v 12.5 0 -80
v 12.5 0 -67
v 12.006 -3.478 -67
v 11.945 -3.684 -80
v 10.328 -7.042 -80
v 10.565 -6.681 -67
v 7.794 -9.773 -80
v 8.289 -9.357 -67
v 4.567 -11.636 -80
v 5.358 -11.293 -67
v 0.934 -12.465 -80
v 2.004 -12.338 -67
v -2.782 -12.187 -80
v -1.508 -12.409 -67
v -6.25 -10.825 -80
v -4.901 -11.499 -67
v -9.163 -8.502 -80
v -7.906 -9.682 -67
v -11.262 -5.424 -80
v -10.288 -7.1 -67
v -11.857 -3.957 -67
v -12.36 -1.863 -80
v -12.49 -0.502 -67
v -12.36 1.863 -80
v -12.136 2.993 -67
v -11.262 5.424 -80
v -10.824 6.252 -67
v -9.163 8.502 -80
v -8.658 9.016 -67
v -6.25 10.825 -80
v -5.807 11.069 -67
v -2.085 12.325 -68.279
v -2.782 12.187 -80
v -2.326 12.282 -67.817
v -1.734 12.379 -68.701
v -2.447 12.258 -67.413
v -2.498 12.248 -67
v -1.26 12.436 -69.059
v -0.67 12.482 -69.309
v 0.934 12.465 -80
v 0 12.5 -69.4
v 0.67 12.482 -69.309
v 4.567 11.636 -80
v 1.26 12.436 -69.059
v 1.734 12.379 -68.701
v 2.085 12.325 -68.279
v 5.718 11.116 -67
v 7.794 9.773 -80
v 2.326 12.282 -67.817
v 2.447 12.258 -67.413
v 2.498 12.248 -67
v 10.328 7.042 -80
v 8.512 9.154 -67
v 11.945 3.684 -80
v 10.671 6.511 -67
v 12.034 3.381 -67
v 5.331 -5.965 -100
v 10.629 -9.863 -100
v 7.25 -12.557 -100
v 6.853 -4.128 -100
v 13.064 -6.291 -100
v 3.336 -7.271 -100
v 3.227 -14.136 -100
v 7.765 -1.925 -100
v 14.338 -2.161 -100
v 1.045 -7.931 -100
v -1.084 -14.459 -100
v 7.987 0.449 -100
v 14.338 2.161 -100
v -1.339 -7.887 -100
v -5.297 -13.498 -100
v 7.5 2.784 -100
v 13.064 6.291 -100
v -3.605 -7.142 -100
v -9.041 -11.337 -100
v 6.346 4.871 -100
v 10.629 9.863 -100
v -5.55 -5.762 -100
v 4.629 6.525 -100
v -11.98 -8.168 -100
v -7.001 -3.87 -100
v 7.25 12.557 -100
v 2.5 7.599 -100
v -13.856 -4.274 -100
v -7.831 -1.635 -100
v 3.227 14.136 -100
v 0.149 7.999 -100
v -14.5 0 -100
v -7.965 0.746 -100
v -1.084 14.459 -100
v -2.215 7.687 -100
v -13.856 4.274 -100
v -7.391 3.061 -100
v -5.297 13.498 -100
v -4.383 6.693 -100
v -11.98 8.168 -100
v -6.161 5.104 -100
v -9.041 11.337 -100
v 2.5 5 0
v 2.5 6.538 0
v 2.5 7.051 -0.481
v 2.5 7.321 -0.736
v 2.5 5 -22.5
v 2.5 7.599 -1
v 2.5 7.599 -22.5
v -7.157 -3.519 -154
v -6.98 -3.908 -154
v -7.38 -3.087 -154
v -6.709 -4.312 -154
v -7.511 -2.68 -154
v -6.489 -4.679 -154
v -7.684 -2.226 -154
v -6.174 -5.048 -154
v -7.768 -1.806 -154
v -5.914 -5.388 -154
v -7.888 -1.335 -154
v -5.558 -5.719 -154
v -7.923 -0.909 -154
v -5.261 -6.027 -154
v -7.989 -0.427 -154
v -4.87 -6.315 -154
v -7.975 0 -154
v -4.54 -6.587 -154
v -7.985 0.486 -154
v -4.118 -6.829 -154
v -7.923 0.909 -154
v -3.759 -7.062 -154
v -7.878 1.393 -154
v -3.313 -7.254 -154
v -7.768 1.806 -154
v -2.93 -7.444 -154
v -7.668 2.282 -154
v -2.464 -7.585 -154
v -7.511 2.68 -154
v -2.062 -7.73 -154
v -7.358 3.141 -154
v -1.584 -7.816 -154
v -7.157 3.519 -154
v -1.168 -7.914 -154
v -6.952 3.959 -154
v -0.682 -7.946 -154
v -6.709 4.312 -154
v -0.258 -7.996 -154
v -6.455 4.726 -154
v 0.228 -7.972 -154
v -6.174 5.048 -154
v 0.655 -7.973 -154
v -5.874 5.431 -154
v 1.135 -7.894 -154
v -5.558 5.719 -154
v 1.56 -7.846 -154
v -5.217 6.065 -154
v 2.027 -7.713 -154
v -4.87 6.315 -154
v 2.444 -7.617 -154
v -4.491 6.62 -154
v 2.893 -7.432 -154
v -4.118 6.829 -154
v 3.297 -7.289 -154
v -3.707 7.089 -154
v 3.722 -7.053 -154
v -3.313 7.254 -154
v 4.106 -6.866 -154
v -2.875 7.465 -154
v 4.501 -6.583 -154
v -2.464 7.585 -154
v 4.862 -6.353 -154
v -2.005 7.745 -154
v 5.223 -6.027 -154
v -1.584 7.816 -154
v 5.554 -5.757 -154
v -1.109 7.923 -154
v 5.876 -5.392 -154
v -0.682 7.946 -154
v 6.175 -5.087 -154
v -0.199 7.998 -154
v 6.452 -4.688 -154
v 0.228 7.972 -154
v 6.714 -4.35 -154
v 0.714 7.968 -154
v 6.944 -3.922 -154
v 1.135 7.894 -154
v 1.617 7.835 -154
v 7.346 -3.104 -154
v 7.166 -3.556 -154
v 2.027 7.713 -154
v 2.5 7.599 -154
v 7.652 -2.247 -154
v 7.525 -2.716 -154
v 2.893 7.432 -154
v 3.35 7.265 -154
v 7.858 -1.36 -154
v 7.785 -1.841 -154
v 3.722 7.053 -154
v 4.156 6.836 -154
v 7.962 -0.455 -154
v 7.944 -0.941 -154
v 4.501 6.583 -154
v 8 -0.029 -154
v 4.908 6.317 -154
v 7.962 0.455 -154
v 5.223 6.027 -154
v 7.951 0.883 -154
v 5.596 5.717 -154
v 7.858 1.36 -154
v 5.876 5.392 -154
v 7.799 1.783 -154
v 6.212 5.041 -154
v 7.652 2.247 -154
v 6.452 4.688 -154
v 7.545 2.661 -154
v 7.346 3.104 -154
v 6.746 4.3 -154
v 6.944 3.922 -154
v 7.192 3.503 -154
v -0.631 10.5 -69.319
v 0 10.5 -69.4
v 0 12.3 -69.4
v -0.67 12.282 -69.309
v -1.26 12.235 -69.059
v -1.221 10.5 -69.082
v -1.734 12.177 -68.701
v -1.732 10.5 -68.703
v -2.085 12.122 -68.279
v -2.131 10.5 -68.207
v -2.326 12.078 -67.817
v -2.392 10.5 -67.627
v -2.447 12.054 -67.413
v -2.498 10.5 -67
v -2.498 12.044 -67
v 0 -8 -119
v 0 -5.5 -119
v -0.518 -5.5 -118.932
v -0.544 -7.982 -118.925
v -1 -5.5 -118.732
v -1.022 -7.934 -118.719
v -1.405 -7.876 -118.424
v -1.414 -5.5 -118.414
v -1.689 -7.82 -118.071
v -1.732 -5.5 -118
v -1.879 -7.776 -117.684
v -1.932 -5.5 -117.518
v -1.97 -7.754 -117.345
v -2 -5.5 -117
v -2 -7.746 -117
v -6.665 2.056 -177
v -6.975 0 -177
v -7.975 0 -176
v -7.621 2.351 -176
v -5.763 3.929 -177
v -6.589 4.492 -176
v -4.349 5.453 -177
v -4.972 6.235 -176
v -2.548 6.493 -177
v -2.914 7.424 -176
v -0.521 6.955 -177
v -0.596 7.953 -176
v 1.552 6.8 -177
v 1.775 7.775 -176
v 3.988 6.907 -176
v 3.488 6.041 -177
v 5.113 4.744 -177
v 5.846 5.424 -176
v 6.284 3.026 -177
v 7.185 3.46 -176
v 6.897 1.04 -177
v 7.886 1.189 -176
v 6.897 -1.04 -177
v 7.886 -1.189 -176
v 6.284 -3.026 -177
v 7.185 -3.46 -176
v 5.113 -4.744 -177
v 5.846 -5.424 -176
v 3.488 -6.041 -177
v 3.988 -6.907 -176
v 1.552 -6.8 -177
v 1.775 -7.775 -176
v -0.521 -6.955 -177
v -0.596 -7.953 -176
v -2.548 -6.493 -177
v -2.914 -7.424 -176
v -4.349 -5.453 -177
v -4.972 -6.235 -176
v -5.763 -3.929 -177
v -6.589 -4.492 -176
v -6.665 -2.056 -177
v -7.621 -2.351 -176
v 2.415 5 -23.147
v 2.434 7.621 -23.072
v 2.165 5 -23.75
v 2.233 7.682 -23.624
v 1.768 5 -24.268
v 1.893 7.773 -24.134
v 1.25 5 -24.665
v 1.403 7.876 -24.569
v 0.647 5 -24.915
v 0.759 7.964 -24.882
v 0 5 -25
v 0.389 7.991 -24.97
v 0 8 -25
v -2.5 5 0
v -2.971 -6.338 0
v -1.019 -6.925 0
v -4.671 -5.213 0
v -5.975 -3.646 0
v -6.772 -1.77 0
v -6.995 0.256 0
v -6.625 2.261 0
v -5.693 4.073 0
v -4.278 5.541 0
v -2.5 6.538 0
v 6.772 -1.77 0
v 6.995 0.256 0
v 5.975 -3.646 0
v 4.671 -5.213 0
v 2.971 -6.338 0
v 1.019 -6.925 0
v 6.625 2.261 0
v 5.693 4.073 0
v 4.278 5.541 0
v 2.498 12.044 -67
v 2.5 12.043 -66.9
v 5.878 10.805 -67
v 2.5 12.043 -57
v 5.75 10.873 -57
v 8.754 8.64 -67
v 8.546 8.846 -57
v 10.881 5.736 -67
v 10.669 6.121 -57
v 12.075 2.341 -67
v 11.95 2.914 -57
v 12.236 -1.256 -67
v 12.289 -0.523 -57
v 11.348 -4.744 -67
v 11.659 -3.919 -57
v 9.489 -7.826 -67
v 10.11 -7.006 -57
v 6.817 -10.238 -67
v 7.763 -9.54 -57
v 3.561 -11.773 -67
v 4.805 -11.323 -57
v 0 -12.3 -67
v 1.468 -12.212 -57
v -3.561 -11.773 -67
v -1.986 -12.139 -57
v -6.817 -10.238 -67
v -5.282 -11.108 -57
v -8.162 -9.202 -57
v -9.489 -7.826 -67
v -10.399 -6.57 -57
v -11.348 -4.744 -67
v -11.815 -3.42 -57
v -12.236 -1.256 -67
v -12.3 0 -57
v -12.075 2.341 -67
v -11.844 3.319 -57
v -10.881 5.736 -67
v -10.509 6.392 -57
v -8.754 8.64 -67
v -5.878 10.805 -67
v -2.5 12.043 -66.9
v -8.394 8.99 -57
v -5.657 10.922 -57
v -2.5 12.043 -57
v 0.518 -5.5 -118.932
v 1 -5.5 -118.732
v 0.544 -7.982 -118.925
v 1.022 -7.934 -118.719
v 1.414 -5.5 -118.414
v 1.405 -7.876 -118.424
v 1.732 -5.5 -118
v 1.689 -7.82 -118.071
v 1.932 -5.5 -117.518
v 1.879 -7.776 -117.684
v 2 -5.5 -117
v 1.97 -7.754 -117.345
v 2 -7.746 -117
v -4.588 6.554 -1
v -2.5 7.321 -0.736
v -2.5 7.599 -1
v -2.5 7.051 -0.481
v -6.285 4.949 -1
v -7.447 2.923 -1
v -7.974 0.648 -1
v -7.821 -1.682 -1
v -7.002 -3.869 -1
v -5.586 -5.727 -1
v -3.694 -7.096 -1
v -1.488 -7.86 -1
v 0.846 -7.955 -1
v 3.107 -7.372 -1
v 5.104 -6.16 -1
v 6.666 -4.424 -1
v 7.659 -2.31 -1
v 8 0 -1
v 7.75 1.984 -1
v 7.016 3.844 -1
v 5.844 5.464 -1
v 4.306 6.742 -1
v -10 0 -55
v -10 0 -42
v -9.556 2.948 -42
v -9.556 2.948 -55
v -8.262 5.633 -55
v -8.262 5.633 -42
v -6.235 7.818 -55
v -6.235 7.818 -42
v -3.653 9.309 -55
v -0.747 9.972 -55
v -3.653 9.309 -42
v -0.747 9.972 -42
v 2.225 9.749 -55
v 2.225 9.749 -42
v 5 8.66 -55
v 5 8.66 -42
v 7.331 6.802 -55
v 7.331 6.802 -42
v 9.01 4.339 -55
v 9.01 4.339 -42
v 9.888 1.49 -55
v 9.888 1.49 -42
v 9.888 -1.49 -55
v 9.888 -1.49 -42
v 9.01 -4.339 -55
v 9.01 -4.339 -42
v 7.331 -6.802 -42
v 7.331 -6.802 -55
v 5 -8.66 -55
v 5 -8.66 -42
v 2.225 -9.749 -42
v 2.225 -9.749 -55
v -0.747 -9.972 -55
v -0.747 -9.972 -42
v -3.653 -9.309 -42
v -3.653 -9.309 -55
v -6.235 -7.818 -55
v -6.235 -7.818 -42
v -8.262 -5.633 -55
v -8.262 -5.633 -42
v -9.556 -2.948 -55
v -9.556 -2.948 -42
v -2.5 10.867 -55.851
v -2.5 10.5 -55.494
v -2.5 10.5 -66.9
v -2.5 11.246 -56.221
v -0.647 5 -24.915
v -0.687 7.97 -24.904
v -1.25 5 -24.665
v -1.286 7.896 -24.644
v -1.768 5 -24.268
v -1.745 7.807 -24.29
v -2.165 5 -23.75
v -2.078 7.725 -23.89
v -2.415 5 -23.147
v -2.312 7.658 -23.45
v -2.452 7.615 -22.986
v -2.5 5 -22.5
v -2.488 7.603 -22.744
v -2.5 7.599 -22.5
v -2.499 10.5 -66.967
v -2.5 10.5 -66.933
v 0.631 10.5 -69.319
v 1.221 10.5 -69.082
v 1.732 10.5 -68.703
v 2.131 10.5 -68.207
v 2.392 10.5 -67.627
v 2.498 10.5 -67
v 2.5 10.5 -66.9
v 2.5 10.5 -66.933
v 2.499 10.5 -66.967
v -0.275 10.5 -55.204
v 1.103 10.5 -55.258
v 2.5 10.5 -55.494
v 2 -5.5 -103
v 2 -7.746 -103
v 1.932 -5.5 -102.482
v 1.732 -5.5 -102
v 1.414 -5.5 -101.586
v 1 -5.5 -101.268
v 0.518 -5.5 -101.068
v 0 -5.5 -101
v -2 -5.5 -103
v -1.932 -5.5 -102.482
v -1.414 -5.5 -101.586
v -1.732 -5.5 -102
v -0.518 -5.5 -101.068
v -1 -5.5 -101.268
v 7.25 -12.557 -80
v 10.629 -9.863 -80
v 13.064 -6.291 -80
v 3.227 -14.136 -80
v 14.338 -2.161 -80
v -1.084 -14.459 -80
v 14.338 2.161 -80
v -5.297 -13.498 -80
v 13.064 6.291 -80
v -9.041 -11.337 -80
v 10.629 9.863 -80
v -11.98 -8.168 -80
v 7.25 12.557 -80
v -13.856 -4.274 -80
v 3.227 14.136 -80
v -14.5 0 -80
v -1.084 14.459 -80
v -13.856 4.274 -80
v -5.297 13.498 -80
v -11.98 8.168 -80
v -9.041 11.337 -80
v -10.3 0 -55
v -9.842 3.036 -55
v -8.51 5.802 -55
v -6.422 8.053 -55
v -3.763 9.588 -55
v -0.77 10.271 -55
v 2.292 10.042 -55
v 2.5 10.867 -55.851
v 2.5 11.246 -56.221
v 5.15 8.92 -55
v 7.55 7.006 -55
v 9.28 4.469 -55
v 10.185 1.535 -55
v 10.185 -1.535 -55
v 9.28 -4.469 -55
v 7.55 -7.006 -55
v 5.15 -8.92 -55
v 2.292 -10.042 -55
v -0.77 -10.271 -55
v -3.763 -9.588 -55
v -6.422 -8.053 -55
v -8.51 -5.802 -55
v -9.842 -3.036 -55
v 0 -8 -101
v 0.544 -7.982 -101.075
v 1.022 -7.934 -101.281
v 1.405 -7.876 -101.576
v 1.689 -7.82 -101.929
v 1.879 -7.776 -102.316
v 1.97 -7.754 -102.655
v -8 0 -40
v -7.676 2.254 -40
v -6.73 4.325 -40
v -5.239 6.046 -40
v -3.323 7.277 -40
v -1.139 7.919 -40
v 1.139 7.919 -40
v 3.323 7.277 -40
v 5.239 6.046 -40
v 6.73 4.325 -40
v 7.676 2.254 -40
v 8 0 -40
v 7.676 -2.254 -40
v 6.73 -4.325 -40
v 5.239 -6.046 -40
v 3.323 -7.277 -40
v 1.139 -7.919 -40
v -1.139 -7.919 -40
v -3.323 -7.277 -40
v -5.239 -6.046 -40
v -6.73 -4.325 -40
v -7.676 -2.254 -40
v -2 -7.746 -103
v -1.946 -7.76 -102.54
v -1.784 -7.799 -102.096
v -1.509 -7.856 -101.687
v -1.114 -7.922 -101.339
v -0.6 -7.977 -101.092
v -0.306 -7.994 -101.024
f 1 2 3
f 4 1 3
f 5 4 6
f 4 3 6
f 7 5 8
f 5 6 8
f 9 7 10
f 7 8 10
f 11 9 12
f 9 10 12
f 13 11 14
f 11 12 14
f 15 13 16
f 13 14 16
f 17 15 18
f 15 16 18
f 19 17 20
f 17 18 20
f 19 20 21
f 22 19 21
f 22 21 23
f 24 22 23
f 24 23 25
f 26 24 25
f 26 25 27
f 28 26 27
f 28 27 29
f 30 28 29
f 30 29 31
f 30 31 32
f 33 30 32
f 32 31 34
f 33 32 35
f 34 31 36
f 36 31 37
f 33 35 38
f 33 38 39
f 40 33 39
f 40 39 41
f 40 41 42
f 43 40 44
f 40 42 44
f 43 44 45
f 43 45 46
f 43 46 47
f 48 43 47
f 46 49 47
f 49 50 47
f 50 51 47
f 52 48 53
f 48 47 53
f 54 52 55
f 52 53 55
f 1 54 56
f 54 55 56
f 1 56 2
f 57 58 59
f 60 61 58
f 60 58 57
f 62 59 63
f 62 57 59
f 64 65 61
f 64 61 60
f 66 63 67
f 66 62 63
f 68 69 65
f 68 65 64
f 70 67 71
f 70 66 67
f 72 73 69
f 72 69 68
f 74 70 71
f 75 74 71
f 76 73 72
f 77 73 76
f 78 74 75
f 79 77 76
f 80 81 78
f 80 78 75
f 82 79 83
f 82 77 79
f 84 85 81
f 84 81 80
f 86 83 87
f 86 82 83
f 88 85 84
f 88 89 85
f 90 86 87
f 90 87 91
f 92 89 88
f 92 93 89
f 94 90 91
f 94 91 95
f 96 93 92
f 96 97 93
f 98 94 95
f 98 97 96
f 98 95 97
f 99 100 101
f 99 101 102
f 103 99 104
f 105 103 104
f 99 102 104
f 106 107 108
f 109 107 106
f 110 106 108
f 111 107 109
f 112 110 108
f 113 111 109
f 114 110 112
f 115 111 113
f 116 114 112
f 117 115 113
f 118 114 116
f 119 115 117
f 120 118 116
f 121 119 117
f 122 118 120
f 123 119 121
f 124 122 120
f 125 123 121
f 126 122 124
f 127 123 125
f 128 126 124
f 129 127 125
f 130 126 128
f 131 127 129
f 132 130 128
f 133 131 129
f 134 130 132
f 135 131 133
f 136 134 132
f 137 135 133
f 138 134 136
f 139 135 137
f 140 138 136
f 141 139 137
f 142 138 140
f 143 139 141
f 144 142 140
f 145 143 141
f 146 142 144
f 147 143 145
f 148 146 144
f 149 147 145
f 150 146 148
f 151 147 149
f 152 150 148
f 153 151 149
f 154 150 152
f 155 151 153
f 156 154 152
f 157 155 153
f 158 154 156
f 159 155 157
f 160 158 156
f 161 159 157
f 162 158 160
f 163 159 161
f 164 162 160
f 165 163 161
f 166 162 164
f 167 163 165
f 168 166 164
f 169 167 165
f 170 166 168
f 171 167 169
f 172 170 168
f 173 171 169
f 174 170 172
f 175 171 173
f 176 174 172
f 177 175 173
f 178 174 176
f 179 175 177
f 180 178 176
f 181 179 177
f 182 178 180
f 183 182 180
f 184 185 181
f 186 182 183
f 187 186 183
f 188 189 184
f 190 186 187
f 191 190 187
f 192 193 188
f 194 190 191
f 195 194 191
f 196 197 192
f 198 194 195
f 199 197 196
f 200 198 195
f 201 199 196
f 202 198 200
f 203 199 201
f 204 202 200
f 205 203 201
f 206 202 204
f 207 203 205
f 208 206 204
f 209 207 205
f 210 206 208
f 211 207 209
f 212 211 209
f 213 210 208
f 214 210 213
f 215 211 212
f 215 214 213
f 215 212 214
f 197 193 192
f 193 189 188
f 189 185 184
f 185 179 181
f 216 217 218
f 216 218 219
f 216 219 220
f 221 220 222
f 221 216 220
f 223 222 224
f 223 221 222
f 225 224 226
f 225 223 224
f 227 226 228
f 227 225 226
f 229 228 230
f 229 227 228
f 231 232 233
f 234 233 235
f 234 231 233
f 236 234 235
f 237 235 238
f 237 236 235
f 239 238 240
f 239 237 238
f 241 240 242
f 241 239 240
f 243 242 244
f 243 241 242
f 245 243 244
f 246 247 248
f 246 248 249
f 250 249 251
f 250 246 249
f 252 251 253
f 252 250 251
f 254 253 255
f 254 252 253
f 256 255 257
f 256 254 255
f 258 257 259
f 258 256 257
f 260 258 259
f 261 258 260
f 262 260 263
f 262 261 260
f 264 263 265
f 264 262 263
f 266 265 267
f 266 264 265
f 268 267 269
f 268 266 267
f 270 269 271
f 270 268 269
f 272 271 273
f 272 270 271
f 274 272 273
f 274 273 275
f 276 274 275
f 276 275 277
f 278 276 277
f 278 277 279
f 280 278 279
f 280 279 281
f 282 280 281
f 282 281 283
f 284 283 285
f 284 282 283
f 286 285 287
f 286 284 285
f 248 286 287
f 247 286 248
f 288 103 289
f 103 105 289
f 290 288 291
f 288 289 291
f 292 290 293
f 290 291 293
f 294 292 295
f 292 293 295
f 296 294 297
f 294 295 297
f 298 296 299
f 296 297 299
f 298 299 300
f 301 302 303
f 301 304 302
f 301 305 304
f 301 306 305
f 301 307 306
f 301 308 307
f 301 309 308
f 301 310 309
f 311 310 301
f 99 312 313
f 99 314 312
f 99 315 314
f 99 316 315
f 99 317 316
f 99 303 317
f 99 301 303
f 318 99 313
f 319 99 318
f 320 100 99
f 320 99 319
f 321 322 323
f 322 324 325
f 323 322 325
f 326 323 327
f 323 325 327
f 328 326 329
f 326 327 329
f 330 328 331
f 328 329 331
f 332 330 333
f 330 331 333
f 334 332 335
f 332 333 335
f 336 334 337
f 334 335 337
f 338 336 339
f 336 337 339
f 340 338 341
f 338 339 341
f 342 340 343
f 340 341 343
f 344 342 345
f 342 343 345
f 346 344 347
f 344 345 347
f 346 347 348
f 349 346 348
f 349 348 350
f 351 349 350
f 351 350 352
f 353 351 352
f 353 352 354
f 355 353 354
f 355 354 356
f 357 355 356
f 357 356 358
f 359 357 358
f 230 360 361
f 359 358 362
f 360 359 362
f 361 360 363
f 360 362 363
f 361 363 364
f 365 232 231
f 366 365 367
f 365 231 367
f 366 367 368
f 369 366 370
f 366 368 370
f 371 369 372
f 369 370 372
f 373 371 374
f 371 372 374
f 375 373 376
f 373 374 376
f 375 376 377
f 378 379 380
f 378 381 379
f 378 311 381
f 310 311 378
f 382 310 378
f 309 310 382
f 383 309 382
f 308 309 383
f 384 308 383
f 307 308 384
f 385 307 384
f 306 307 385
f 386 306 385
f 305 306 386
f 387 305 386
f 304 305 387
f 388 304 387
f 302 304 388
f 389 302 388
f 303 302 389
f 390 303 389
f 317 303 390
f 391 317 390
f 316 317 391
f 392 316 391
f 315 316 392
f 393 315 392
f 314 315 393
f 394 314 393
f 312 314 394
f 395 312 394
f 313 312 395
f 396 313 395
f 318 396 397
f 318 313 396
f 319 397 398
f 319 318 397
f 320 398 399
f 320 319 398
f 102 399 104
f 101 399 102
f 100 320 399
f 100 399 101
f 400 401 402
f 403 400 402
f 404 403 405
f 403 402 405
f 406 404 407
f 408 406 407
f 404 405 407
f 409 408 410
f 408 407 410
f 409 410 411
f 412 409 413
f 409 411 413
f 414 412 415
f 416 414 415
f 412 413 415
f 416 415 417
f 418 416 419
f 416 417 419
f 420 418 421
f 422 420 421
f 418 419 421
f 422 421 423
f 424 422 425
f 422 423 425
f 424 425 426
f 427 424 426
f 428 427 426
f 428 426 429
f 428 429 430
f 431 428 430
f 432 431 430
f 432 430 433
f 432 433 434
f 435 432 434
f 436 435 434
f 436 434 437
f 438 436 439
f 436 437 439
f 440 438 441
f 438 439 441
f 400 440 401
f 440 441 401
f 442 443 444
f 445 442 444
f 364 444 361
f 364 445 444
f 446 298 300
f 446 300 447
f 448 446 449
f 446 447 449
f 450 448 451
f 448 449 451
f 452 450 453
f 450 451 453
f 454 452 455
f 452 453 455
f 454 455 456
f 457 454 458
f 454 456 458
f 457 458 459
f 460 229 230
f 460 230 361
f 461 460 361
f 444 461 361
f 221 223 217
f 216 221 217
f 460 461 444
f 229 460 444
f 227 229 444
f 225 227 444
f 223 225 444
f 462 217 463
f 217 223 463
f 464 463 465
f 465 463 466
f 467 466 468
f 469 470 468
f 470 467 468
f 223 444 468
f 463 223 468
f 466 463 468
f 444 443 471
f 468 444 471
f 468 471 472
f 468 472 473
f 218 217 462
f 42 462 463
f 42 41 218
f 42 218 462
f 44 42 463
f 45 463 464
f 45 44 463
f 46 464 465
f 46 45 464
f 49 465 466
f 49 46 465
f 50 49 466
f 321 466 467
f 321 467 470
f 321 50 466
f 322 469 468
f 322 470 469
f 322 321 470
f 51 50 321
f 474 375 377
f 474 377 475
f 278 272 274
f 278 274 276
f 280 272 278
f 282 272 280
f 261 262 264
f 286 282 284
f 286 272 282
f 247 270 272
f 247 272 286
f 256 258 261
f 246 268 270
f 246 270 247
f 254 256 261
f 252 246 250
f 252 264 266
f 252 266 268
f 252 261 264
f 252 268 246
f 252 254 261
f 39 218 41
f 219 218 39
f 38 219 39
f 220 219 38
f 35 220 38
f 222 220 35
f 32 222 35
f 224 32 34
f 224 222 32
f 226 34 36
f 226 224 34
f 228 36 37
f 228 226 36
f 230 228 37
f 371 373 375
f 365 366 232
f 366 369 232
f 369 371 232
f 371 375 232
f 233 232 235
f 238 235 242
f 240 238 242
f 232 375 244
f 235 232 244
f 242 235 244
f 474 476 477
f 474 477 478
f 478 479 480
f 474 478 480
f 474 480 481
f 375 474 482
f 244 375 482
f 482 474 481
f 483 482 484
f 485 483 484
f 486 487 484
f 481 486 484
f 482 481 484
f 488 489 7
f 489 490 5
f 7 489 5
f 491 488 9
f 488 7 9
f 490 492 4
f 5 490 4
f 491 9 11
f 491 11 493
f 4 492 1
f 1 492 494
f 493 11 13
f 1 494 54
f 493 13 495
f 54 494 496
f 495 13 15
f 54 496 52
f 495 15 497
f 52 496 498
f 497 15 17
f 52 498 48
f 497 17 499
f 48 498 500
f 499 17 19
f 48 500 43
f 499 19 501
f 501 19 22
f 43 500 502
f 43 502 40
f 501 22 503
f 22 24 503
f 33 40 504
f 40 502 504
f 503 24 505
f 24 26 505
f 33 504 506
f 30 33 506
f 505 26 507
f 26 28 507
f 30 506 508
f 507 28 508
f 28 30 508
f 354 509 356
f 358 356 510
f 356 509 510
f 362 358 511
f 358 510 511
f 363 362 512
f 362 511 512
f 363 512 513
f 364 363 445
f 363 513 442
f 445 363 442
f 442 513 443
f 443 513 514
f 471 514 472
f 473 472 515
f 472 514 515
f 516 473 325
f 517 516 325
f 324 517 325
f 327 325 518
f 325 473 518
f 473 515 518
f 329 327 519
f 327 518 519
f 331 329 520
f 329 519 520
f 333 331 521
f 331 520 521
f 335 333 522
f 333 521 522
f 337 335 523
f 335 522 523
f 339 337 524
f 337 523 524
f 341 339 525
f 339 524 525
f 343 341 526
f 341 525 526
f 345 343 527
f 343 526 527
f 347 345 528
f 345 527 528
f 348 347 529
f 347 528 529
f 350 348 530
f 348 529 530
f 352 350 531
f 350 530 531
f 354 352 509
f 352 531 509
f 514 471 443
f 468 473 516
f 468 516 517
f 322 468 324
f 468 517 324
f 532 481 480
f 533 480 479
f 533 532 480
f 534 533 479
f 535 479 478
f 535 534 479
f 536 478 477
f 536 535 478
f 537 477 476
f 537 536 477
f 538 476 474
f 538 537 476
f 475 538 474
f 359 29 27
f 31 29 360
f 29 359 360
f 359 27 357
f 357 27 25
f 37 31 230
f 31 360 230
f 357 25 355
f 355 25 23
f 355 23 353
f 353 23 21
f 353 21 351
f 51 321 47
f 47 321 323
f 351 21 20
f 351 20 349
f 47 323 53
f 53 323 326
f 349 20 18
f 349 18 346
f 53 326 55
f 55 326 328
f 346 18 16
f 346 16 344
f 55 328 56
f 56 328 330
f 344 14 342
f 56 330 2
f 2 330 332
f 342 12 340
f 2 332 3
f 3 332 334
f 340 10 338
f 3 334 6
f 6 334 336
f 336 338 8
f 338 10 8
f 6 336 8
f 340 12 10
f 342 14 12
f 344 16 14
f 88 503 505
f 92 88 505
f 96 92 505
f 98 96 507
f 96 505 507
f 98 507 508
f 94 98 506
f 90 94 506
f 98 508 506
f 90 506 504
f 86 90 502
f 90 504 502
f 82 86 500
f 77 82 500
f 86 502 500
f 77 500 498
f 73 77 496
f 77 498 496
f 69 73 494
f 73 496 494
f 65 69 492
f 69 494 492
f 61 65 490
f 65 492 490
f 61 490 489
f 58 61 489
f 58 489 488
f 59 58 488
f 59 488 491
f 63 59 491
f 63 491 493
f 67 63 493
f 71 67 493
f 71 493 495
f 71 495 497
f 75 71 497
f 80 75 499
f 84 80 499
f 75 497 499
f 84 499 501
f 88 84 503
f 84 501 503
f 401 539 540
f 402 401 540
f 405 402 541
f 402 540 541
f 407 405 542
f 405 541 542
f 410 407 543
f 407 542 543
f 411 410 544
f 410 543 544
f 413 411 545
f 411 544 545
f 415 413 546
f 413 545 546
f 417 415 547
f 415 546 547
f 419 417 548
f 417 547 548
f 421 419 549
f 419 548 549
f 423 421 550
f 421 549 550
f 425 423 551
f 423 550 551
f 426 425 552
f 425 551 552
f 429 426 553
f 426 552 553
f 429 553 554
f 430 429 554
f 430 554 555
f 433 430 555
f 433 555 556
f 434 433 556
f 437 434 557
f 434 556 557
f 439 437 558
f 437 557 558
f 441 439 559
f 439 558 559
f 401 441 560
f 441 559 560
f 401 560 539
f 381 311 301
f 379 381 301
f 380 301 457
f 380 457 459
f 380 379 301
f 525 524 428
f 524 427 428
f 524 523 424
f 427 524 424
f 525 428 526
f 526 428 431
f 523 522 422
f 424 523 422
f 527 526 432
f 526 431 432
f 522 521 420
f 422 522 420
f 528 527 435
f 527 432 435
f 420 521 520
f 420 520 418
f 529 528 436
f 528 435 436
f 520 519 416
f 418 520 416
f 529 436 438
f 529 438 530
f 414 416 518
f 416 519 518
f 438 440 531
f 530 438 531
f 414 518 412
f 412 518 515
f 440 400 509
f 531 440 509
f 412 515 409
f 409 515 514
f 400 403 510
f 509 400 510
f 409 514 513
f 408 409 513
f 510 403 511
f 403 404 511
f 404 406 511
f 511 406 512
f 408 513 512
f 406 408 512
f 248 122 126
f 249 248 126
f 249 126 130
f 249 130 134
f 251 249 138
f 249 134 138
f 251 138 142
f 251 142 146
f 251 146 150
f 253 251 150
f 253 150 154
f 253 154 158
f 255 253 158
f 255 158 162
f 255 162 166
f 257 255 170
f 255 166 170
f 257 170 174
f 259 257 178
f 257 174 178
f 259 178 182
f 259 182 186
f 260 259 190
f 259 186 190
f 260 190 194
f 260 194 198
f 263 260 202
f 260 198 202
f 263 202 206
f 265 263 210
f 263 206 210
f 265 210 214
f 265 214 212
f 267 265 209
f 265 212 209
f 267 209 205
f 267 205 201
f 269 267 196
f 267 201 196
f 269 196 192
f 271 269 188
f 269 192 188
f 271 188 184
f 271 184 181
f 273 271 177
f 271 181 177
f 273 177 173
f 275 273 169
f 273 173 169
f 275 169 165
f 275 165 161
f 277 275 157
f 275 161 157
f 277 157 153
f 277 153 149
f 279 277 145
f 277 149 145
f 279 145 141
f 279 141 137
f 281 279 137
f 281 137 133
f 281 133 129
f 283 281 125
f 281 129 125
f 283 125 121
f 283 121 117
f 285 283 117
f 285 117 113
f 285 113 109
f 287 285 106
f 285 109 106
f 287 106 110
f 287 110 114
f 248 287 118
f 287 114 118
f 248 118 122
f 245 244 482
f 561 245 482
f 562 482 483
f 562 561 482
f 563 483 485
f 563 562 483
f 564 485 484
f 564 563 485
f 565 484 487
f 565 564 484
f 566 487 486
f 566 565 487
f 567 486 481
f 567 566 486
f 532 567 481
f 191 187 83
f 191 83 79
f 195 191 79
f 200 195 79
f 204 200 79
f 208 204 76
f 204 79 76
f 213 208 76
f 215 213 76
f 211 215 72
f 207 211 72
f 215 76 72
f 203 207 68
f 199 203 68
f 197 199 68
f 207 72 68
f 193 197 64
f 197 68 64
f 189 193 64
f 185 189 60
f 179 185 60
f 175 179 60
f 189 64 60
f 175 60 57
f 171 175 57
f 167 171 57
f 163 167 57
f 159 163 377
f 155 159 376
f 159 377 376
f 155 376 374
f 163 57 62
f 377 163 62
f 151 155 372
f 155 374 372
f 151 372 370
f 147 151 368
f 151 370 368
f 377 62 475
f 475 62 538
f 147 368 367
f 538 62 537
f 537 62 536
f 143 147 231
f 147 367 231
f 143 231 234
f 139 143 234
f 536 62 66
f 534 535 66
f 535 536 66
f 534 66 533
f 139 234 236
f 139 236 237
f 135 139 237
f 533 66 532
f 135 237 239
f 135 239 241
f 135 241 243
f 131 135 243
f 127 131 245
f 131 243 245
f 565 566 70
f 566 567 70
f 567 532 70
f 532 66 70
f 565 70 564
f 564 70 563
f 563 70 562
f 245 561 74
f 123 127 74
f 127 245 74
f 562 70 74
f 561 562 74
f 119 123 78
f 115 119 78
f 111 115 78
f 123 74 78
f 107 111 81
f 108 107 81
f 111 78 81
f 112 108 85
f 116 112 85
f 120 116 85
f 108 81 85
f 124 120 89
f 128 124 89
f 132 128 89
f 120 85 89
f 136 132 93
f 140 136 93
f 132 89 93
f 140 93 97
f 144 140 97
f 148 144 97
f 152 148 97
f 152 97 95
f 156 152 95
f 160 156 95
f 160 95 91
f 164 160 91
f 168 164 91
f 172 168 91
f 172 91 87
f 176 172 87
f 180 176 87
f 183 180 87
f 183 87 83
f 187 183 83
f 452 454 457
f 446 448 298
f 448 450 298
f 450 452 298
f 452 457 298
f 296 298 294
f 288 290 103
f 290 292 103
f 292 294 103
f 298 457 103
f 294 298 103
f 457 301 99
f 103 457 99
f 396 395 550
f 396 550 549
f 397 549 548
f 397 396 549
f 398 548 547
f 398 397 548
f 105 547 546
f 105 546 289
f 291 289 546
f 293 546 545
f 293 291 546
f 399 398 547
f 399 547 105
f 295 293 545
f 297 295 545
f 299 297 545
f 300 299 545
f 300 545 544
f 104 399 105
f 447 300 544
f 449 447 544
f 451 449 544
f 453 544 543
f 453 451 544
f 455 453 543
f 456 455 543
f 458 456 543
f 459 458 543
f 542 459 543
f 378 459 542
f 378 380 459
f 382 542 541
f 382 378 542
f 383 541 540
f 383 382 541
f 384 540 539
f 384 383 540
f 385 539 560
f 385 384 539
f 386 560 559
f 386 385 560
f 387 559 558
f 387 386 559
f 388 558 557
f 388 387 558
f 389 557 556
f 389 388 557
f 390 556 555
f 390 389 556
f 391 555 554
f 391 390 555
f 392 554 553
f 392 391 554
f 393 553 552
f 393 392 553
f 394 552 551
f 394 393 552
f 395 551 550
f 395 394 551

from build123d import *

# Parameters (mm, degrees)
SKETCH1_R          = 8
EXTRUDE1_DEPTH     = 40
SKETCH2_W          = 5
SKETCH2_H          = 3.872152866
CUT_EXTRUDE1_DEPTH = 25
FILLET1_R          = 2.5
CHAMFER1_SIZE      = 1
SKETCH3_R          = 10
EXTRUDE2_DEPTH     = 15
CHAMFER2_SIZE      = 2
SKETCH4_R          = 12.3
EXTRUDE3_DEPTH     = 12
CHAMFER3_SIZE      = 2
SKETCH5_R          = 12.5
EXTRUDE4_DEPTH     = 13
SKETCH6_R          = 14.5
EXTRUDE5_DEPTH     = 20
SKETCH10_W         = 5
SKETCH10_H         = 6.103543743
CUT_EXTRUDE2_DEPTH = 14.4
FILLET2_R          = 2.5
SKETCH9_R          = 8
EXTRUDE6_DEPTH     = 54
SKETCH11_W         = 4
SKETCH11_H         = 18
CUT_EXTRUDE3_DEPTH = 156.968746869
FILLET3_R          = 2
SKETCH12_R         = 7.975
EXTRUDE7_DEPTH     = 23
CHAMFER4_SIZE      = 1


# Some blends are built 0.0001 mm under size
with BuildPart() as part:
    # Sketch1 → Extrude1 (new body)
    with BuildSketch(Plane.XY):
        Circle(SKETCH1_R)
    extrude(amount=-EXTRUDE1_DEPTH)

    # Sketch2 → Cut-Extrude1 (cut)
    with BuildSketch(Plane.XY):
        with Locations((0, 6.936076433)):
            Rectangle(SKETCH2_W, SKETCH2_H)
    extrude(amount=-CUT_EXTRUDE1_DEPTH, mode=Mode.SUBTRACT)

    # Fillet1
    fillet1_edges = [part.edges().sort_by_distance(p)[0] for p in [
        (2.5, 6.299671038, -25),
        (-2.5, 6.299671038, -25),
    ]]
    fillet(fillet1_edges, radius=FILLET1_R - 0.0001)  # a hair under: the kernel refuses the full size

    # Chamfer1
    chamfer1_edges = [part.edges().sort_by_distance(p)[0] for p in [
        (-4.69041576, -6.480740698, 0),
    ]]
    chamfer(chamfer1_edges, length=CHAMFER1_SIZE)

    # Sketch3 → Extrude2 (add)
    with BuildSketch(Plane(origin=(0, 0, -40), x_dir=(-1, 0, 0), z_dir=(0, 0, -1))):
        Circle(SKETCH3_R)
    extrude(amount=EXTRUDE2_DEPTH)

    # Chamfer2
    chamfer2_edges = [part.edges().sort_by_distance(p)[0] for p in [
        (10, 0, -40),
    ]]
    chamfer(chamfer2_edges, length=CHAMFER2_SIZE - 0.0001)  # a hair under: the kernel refuses the full size

    # Sketch4 → Extrude3 (add)
    with BuildSketch(Plane(origin=(0, 0, -55), x_dir=(-1, 0, 0), z_dir=(0, 0, -1))):
        Circle(SKETCH4_R)
    extrude(amount=EXTRUDE3_DEPTH)

    # Chamfer3
    chamfer3_edges = [part.edges().sort_by_distance(p)[0] for p in [
        (12.3, 0, -55),
    ]]
    chamfer(chamfer3_edges, length=CHAMFER3_SIZE)

    # Sketch5 → Extrude4 (add)
    with BuildSketch(Plane(origin=(0, 0, -67), x_dir=(-1, 0, 0), z_dir=(0, 0, -1))):
        with Locations(Location((0, 0, 0), (0, 0, 180))):
            Circle(SKETCH5_R)
    extrude(amount=EXTRUDE4_DEPTH)

    # Sketch6 → Extrude5 (add)
    with BuildSketch(Plane(origin=(0, 0, -80), x_dir=(-1, 0, 0), z_dir=(0, 0, -1))):
        Circle(SKETCH6_R)
    extrude(amount=EXTRUDE5_DEPTH)

    # Sketch10 → Cut-Extrude2 (cut)
    with BuildSketch(Plane.XY.offset(-55)):
        with Locations((0, 13.551771871)):
            Rectangle(SKETCH10_W, SKETCH10_H)
    extrude(amount=-CUT_EXTRUDE2_DEPTH, mode=Mode.SUBTRACT)

    # Fillet2
    # the kernel refuses this fillet: 2.5 mm, written as the material it adds along each edge
    with BuildSketch(Plane(origin=(2.5, 18.497448714, -69.4), x_dir=(0, 0, 1), z_dir=(0, -1, 0))) as fillet2_piece_1_section:
        with BuildLine():
            CenterArc((FILLET2_R, FILLET2_R), FILLET2_R, 180, 90)
            Line((0, FILLET2_R), (0, 0))
            Line((0, 0), (FILLET2_R, 0))
        make_face()
    fillet2_piece_1 = extrude(amount=14.247448714, mode=Mode.PRIVATE)
    fillet2_piece_1 = fillet2_piece_1 & Plane(origin=(0, 0, -68.840122938), x_dir=(1, 0, 0), z_dir=(0, 0, 1)) * Cylinder(12.5, 39, mode=Mode.PRIVATE)
    fillet2_piece_1 = split(fillet2_piece_1, bisect_by=Plane(origin=(1.944027658, 12.237538555, -67), z_dir=(0, 0, -1)), keep=Keep.TOP, mode=Mode.PRIVATE)
    add(fillet2_piece_1)
    with BuildSketch(Plane(origin=(2.5, 18.497448714, -69.4), x_dir=(0, 0, 1), z_dir=(0, -1, 0))) as fillet2_piece_2_section:
        with BuildLine():
            CenterArc((FILLET2_R, FILLET2_R), FILLET2_R, 180, 90)
            Line((0, FILLET2_R), (0, 0))
            Line((0, 0), (FILLET2_R, 0))
        make_face()
    fillet2_piece_2 = extrude(amount=14.247448714, mode=Mode.PRIVATE)
    fillet2_piece_2 = fillet2_piece_2 & Plane(origin=(0, 0, -66.975002686), x_dir=(-1, 0, 0), z_dir=(0, 0, 1)) * Cylinder(12.3, 39, mode=Mode.PRIVATE)
    add(fillet2_piece_2)
    with BuildSketch(Plane(origin=(-2.5, 4.25, -69.4), x_dir=(1, 0, 0), z_dir=(0, 1, 0))) as fillet2_piece_3_section:
        with BuildLine():
            CenterArc((FILLET2_R, -FILLET2_R), FILLET2_R, 90, 90)
            Line((0, -FILLET2_R), (0, 0))
            Line((0, 0), (FILLET2_R, 0))
        make_face()
    fillet2_piece_3 = extrude(amount=14.247448714, mode=Mode.PRIVATE)
    fillet2_piece_3 = fillet2_piece_3 & Plane(origin=(0, 0, -68.853362748), x_dir=(1, 0, 0), z_dir=(0, 0, 1)) * Cylinder(12.5, 39, mode=Mode.PRIVATE)
    fillet2_piece_3 = split(fillet2_piece_3, bisect_by=Plane(origin=(-1.922744222, 11.319637846, -67), z_dir=(0, 0, -1)), keep=Keep.TOP, mode=Mode.PRIVATE)
    add(fillet2_piece_3)
    with BuildSketch(Plane(origin=(-2.5, 4.25, -69.4), x_dir=(1, 0, 0), z_dir=(0, 1, 0))) as fillet2_piece_4_section:
        with BuildLine():
            CenterArc((FILLET2_R, -FILLET2_R), FILLET2_R, 90, 90)
            Line((0, -FILLET2_R), (0, 0))
            Line((0, 0), (FILLET2_R, 0))
        make_face()
    fillet2_piece_4 = extrude(amount=14.247448714, mode=Mode.PRIVATE)
    fillet2_piece_4 = fillet2_piece_4 & Plane(origin=(0, 0, -66.975002689), x_dir=(-1, 0, 0), z_dir=(0, 0, 1)) * Cylinder(12.3, 39, mode=Mode.PRIVATE)
    add(fillet2_piece_4)

    # Sketch9 → Extrude6 (add)
    with BuildSketch(Plane(origin=(0, 0, -100), x_dir=(-1, 0, 0), z_dir=(0, 0, -1))):
        with Locations(Location((0, 0, 0), (0, 0, 108.209956864))):
            Circle(SKETCH9_R)
    extrude(amount=EXTRUDE6_DEPTH)

    # Sketch11 → Cut-Extrude3 (cut, through all)
    with BuildSketch(Plane(origin=(0, -5.5, 0), x_dir=(-1, 0, 0), z_dir=(0, 1, 0))):
        with Locations((0, -110)):
            Rectangle(SKETCH11_W, SKETCH11_H)
    extrude(amount=-CUT_EXTRUDE3_DEPTH, mode=Mode.SUBTRACT)

    # Fillet3
    fillet3_edges = [part.edges().sort_by_distance(p)[0] for p in [
        (-2, -6.622983346, -119),
        (2, -6.622983346, -119),
        (-2, -6.622983346, -101),
        (2, -6.622983346, -101),
    ]]
    fillet(fillet3_edges, radius=FILLET3_R - 0.0001)  # a hair under: the kernel refuses the full size

    # Sketch12 → Extrude7 (add)
    with BuildSketch(Plane(origin=(0, 0, -154), x_dir=(-1, 0, 0), z_dir=(0, 0, -1))):
        Circle(SKETCH12_R)
    extrude(amount=EXTRUDE7_DEPTH)

    # Chamfer4
    chamfer4_edges = [part.edges().sort_by_distance(p)[0] for p in [
        (7.975, 0, -177),
    ]]
    chamfer(chamfer4_edges, length=CHAMFER4_SIZE)


solid = part.part
